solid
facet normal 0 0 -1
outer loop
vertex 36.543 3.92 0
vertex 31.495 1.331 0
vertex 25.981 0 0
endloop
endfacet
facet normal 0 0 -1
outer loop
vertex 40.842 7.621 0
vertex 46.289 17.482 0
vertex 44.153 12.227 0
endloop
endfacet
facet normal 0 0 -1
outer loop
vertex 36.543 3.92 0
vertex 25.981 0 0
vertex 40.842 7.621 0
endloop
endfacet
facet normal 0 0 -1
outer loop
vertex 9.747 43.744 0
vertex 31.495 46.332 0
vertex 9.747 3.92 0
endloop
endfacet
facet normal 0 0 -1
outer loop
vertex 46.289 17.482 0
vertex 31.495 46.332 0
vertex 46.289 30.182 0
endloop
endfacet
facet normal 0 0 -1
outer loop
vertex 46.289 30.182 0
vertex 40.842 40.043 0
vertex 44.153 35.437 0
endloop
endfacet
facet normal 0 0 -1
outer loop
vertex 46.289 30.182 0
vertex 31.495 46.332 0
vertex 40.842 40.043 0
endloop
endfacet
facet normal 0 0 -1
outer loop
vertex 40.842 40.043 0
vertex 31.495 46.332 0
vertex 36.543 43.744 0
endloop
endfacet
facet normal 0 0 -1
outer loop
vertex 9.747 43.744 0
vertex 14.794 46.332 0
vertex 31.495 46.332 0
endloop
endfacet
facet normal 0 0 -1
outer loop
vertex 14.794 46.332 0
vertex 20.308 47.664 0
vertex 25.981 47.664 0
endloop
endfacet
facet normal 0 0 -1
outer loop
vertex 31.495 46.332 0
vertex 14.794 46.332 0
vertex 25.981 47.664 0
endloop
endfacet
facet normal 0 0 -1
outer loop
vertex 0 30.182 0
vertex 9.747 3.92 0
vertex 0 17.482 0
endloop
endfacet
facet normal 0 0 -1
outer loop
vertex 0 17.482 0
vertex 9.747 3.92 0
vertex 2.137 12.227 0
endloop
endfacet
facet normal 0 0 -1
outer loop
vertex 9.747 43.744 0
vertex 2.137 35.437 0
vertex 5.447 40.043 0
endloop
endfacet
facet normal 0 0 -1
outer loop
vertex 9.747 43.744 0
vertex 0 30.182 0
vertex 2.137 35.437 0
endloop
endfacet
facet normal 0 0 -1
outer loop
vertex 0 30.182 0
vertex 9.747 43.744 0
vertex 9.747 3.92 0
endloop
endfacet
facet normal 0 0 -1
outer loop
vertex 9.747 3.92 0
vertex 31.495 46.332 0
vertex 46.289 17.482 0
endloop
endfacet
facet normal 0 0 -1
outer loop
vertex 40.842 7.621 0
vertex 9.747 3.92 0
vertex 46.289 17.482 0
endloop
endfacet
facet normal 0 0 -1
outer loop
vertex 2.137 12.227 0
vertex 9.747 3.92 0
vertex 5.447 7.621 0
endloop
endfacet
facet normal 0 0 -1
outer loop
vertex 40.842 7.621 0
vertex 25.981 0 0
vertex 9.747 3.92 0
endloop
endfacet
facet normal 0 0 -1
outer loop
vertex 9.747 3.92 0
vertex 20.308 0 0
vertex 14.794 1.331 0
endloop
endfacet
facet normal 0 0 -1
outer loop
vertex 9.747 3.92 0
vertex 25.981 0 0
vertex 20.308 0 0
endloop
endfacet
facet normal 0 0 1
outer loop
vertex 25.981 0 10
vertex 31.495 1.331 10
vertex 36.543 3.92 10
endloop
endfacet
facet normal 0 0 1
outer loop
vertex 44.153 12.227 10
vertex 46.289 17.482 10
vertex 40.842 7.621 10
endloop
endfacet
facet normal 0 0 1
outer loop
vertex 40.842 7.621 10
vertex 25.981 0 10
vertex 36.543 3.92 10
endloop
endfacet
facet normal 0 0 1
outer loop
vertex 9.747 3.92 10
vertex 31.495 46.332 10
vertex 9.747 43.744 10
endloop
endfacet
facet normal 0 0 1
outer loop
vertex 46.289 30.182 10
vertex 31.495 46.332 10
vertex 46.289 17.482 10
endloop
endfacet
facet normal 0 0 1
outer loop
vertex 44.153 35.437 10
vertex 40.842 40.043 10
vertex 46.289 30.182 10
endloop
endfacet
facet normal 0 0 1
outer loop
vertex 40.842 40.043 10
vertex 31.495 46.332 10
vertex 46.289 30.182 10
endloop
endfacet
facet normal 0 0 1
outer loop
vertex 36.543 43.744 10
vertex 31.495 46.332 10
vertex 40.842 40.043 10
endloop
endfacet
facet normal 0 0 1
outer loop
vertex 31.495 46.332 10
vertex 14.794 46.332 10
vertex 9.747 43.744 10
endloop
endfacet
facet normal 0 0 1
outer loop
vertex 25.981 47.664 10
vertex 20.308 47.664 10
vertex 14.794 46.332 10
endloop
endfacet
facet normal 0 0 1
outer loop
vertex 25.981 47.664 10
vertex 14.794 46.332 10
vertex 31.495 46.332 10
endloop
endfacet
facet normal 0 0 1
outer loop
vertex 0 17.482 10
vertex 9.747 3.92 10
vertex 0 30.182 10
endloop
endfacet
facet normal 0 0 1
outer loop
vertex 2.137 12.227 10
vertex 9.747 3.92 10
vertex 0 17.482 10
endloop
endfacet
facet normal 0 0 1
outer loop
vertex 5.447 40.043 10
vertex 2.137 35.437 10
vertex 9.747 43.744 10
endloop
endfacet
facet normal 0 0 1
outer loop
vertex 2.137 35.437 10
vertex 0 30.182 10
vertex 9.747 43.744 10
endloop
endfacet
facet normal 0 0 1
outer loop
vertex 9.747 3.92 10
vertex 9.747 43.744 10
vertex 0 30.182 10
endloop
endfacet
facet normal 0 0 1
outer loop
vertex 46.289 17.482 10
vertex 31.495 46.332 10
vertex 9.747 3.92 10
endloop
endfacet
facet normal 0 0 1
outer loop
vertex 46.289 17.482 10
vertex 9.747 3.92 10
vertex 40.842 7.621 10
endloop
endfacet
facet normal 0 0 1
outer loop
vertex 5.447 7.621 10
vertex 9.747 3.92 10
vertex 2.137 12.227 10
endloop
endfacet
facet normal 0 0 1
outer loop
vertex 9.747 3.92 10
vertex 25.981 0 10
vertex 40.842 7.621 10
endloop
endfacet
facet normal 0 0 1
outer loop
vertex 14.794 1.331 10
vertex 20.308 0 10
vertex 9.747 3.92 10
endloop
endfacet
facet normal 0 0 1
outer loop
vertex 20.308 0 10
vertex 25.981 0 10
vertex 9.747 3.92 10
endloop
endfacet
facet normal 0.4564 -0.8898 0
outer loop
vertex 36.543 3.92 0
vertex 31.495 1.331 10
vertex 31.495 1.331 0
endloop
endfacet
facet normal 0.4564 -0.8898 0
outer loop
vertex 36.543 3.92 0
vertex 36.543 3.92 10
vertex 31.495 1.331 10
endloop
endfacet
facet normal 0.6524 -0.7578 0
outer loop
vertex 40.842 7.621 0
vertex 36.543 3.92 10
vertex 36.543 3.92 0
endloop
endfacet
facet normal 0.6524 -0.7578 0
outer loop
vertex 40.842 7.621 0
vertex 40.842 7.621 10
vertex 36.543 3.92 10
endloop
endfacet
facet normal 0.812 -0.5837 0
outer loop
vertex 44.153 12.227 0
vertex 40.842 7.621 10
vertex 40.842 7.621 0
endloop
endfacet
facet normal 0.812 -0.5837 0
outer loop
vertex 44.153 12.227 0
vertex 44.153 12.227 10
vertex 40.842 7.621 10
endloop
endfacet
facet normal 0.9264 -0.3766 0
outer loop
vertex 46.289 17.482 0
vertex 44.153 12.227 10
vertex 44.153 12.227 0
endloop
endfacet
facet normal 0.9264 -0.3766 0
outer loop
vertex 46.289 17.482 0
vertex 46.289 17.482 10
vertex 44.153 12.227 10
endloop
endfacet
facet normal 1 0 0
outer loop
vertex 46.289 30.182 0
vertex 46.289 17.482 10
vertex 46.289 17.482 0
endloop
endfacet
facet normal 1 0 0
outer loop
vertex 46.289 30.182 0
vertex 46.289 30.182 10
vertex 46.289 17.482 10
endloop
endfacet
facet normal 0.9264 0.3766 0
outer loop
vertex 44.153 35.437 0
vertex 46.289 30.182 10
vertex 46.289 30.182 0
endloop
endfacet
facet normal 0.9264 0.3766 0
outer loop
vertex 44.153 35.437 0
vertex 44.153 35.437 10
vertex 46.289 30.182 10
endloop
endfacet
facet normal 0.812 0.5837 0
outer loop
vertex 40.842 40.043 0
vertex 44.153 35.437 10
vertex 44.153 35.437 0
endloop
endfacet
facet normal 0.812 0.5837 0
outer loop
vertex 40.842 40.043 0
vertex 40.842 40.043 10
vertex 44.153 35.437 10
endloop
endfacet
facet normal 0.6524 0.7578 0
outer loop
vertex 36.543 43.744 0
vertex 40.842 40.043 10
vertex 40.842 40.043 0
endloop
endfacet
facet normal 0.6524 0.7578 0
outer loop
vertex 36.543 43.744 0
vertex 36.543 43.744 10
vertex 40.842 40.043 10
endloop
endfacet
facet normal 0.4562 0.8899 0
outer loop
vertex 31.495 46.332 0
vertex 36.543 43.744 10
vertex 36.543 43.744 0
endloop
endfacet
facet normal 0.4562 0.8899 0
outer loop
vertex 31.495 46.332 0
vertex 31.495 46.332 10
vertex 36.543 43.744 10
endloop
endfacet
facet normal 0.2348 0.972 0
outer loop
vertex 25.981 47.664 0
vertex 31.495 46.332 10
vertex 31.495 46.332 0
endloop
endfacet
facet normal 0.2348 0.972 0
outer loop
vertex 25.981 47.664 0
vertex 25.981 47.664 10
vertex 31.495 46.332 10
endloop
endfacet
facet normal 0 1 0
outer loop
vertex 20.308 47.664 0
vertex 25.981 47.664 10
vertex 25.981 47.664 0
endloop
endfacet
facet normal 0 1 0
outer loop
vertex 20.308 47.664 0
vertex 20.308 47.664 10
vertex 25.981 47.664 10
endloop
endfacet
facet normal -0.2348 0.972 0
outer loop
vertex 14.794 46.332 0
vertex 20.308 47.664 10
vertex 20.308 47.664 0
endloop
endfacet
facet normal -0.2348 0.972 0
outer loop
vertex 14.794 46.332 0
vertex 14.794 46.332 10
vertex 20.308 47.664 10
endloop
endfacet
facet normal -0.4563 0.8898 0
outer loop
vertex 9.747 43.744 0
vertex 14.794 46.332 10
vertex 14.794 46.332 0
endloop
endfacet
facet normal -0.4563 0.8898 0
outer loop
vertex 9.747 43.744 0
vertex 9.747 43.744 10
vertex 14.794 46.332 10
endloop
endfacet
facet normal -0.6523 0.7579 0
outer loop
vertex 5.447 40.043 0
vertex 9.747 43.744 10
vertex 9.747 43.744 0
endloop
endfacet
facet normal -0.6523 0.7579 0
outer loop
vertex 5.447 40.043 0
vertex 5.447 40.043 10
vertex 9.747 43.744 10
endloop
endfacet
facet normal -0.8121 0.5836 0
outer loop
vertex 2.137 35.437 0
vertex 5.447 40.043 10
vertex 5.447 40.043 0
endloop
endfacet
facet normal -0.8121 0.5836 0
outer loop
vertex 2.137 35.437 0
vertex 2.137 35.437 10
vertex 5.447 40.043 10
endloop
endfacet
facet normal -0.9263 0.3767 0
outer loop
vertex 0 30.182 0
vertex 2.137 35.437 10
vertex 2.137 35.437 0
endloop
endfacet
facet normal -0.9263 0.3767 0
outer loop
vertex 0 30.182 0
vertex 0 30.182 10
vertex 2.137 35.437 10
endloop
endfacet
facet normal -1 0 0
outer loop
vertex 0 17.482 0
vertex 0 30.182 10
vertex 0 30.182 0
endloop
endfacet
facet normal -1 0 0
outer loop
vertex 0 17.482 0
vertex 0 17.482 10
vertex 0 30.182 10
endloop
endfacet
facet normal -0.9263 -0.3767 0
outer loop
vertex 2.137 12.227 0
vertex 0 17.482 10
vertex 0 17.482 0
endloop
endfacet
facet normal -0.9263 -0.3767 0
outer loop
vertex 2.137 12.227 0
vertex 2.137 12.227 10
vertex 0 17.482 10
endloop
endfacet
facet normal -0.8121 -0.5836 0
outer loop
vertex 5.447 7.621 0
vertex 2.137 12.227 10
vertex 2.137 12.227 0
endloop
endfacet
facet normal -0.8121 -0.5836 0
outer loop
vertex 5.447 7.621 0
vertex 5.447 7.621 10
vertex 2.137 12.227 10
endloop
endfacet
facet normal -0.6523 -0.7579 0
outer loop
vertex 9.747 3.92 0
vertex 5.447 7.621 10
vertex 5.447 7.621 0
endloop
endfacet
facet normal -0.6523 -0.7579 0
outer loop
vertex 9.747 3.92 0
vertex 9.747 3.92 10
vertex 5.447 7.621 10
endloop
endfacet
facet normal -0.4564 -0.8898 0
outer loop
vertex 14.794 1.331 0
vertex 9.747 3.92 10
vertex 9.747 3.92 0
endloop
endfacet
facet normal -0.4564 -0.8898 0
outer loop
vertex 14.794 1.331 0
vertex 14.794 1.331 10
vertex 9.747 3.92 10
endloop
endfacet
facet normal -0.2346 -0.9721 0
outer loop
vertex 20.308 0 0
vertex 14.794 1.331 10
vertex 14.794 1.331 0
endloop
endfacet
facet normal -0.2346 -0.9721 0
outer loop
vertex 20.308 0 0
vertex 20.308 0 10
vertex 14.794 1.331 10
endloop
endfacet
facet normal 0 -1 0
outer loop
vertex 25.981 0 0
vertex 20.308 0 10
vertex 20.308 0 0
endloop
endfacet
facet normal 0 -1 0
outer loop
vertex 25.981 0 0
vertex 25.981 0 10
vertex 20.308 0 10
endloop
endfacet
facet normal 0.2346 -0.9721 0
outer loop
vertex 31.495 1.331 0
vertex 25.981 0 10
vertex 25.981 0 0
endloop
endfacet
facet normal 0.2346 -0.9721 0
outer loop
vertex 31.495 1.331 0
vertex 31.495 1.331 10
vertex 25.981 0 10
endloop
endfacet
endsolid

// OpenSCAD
$fn = 32;

// ----------------------------------------------------------------------
// Flat adaptor: double_d, 10 mm thick
// ----------------------------------------------------------------------

// --- parameters (mm) ---
profile_height = 10;      // extrusion height
profile_points = 24;      // points of the closed outline

profile = [[46.289, 30.182], [44.153, 35.437], [40.842, 40.043], [36.543, 43.744], [31.495, 46.332], [25.981, 47.664], [20.308, 47.664], [14.794, 46.332], [9.747, 43.744], [5.447, 40.043], [2.137, 35.437], [0, 30.182], [0, 17.482], [2.137, 12.227], [5.447, 7.621], [9.747, 3.92], [14.794, 1.331], [20.308, 0], [25.981, 0], [31.495, 1.331], [36.543, 3.92], [40.842, 7.621], [44.153, 12.227], [46.289, 17.482]];  // single closed polygon, 24 points, counter clockwise

// --- the one profile operation ---
linear_extrude(height = profile_height) polygon(points = profile);
